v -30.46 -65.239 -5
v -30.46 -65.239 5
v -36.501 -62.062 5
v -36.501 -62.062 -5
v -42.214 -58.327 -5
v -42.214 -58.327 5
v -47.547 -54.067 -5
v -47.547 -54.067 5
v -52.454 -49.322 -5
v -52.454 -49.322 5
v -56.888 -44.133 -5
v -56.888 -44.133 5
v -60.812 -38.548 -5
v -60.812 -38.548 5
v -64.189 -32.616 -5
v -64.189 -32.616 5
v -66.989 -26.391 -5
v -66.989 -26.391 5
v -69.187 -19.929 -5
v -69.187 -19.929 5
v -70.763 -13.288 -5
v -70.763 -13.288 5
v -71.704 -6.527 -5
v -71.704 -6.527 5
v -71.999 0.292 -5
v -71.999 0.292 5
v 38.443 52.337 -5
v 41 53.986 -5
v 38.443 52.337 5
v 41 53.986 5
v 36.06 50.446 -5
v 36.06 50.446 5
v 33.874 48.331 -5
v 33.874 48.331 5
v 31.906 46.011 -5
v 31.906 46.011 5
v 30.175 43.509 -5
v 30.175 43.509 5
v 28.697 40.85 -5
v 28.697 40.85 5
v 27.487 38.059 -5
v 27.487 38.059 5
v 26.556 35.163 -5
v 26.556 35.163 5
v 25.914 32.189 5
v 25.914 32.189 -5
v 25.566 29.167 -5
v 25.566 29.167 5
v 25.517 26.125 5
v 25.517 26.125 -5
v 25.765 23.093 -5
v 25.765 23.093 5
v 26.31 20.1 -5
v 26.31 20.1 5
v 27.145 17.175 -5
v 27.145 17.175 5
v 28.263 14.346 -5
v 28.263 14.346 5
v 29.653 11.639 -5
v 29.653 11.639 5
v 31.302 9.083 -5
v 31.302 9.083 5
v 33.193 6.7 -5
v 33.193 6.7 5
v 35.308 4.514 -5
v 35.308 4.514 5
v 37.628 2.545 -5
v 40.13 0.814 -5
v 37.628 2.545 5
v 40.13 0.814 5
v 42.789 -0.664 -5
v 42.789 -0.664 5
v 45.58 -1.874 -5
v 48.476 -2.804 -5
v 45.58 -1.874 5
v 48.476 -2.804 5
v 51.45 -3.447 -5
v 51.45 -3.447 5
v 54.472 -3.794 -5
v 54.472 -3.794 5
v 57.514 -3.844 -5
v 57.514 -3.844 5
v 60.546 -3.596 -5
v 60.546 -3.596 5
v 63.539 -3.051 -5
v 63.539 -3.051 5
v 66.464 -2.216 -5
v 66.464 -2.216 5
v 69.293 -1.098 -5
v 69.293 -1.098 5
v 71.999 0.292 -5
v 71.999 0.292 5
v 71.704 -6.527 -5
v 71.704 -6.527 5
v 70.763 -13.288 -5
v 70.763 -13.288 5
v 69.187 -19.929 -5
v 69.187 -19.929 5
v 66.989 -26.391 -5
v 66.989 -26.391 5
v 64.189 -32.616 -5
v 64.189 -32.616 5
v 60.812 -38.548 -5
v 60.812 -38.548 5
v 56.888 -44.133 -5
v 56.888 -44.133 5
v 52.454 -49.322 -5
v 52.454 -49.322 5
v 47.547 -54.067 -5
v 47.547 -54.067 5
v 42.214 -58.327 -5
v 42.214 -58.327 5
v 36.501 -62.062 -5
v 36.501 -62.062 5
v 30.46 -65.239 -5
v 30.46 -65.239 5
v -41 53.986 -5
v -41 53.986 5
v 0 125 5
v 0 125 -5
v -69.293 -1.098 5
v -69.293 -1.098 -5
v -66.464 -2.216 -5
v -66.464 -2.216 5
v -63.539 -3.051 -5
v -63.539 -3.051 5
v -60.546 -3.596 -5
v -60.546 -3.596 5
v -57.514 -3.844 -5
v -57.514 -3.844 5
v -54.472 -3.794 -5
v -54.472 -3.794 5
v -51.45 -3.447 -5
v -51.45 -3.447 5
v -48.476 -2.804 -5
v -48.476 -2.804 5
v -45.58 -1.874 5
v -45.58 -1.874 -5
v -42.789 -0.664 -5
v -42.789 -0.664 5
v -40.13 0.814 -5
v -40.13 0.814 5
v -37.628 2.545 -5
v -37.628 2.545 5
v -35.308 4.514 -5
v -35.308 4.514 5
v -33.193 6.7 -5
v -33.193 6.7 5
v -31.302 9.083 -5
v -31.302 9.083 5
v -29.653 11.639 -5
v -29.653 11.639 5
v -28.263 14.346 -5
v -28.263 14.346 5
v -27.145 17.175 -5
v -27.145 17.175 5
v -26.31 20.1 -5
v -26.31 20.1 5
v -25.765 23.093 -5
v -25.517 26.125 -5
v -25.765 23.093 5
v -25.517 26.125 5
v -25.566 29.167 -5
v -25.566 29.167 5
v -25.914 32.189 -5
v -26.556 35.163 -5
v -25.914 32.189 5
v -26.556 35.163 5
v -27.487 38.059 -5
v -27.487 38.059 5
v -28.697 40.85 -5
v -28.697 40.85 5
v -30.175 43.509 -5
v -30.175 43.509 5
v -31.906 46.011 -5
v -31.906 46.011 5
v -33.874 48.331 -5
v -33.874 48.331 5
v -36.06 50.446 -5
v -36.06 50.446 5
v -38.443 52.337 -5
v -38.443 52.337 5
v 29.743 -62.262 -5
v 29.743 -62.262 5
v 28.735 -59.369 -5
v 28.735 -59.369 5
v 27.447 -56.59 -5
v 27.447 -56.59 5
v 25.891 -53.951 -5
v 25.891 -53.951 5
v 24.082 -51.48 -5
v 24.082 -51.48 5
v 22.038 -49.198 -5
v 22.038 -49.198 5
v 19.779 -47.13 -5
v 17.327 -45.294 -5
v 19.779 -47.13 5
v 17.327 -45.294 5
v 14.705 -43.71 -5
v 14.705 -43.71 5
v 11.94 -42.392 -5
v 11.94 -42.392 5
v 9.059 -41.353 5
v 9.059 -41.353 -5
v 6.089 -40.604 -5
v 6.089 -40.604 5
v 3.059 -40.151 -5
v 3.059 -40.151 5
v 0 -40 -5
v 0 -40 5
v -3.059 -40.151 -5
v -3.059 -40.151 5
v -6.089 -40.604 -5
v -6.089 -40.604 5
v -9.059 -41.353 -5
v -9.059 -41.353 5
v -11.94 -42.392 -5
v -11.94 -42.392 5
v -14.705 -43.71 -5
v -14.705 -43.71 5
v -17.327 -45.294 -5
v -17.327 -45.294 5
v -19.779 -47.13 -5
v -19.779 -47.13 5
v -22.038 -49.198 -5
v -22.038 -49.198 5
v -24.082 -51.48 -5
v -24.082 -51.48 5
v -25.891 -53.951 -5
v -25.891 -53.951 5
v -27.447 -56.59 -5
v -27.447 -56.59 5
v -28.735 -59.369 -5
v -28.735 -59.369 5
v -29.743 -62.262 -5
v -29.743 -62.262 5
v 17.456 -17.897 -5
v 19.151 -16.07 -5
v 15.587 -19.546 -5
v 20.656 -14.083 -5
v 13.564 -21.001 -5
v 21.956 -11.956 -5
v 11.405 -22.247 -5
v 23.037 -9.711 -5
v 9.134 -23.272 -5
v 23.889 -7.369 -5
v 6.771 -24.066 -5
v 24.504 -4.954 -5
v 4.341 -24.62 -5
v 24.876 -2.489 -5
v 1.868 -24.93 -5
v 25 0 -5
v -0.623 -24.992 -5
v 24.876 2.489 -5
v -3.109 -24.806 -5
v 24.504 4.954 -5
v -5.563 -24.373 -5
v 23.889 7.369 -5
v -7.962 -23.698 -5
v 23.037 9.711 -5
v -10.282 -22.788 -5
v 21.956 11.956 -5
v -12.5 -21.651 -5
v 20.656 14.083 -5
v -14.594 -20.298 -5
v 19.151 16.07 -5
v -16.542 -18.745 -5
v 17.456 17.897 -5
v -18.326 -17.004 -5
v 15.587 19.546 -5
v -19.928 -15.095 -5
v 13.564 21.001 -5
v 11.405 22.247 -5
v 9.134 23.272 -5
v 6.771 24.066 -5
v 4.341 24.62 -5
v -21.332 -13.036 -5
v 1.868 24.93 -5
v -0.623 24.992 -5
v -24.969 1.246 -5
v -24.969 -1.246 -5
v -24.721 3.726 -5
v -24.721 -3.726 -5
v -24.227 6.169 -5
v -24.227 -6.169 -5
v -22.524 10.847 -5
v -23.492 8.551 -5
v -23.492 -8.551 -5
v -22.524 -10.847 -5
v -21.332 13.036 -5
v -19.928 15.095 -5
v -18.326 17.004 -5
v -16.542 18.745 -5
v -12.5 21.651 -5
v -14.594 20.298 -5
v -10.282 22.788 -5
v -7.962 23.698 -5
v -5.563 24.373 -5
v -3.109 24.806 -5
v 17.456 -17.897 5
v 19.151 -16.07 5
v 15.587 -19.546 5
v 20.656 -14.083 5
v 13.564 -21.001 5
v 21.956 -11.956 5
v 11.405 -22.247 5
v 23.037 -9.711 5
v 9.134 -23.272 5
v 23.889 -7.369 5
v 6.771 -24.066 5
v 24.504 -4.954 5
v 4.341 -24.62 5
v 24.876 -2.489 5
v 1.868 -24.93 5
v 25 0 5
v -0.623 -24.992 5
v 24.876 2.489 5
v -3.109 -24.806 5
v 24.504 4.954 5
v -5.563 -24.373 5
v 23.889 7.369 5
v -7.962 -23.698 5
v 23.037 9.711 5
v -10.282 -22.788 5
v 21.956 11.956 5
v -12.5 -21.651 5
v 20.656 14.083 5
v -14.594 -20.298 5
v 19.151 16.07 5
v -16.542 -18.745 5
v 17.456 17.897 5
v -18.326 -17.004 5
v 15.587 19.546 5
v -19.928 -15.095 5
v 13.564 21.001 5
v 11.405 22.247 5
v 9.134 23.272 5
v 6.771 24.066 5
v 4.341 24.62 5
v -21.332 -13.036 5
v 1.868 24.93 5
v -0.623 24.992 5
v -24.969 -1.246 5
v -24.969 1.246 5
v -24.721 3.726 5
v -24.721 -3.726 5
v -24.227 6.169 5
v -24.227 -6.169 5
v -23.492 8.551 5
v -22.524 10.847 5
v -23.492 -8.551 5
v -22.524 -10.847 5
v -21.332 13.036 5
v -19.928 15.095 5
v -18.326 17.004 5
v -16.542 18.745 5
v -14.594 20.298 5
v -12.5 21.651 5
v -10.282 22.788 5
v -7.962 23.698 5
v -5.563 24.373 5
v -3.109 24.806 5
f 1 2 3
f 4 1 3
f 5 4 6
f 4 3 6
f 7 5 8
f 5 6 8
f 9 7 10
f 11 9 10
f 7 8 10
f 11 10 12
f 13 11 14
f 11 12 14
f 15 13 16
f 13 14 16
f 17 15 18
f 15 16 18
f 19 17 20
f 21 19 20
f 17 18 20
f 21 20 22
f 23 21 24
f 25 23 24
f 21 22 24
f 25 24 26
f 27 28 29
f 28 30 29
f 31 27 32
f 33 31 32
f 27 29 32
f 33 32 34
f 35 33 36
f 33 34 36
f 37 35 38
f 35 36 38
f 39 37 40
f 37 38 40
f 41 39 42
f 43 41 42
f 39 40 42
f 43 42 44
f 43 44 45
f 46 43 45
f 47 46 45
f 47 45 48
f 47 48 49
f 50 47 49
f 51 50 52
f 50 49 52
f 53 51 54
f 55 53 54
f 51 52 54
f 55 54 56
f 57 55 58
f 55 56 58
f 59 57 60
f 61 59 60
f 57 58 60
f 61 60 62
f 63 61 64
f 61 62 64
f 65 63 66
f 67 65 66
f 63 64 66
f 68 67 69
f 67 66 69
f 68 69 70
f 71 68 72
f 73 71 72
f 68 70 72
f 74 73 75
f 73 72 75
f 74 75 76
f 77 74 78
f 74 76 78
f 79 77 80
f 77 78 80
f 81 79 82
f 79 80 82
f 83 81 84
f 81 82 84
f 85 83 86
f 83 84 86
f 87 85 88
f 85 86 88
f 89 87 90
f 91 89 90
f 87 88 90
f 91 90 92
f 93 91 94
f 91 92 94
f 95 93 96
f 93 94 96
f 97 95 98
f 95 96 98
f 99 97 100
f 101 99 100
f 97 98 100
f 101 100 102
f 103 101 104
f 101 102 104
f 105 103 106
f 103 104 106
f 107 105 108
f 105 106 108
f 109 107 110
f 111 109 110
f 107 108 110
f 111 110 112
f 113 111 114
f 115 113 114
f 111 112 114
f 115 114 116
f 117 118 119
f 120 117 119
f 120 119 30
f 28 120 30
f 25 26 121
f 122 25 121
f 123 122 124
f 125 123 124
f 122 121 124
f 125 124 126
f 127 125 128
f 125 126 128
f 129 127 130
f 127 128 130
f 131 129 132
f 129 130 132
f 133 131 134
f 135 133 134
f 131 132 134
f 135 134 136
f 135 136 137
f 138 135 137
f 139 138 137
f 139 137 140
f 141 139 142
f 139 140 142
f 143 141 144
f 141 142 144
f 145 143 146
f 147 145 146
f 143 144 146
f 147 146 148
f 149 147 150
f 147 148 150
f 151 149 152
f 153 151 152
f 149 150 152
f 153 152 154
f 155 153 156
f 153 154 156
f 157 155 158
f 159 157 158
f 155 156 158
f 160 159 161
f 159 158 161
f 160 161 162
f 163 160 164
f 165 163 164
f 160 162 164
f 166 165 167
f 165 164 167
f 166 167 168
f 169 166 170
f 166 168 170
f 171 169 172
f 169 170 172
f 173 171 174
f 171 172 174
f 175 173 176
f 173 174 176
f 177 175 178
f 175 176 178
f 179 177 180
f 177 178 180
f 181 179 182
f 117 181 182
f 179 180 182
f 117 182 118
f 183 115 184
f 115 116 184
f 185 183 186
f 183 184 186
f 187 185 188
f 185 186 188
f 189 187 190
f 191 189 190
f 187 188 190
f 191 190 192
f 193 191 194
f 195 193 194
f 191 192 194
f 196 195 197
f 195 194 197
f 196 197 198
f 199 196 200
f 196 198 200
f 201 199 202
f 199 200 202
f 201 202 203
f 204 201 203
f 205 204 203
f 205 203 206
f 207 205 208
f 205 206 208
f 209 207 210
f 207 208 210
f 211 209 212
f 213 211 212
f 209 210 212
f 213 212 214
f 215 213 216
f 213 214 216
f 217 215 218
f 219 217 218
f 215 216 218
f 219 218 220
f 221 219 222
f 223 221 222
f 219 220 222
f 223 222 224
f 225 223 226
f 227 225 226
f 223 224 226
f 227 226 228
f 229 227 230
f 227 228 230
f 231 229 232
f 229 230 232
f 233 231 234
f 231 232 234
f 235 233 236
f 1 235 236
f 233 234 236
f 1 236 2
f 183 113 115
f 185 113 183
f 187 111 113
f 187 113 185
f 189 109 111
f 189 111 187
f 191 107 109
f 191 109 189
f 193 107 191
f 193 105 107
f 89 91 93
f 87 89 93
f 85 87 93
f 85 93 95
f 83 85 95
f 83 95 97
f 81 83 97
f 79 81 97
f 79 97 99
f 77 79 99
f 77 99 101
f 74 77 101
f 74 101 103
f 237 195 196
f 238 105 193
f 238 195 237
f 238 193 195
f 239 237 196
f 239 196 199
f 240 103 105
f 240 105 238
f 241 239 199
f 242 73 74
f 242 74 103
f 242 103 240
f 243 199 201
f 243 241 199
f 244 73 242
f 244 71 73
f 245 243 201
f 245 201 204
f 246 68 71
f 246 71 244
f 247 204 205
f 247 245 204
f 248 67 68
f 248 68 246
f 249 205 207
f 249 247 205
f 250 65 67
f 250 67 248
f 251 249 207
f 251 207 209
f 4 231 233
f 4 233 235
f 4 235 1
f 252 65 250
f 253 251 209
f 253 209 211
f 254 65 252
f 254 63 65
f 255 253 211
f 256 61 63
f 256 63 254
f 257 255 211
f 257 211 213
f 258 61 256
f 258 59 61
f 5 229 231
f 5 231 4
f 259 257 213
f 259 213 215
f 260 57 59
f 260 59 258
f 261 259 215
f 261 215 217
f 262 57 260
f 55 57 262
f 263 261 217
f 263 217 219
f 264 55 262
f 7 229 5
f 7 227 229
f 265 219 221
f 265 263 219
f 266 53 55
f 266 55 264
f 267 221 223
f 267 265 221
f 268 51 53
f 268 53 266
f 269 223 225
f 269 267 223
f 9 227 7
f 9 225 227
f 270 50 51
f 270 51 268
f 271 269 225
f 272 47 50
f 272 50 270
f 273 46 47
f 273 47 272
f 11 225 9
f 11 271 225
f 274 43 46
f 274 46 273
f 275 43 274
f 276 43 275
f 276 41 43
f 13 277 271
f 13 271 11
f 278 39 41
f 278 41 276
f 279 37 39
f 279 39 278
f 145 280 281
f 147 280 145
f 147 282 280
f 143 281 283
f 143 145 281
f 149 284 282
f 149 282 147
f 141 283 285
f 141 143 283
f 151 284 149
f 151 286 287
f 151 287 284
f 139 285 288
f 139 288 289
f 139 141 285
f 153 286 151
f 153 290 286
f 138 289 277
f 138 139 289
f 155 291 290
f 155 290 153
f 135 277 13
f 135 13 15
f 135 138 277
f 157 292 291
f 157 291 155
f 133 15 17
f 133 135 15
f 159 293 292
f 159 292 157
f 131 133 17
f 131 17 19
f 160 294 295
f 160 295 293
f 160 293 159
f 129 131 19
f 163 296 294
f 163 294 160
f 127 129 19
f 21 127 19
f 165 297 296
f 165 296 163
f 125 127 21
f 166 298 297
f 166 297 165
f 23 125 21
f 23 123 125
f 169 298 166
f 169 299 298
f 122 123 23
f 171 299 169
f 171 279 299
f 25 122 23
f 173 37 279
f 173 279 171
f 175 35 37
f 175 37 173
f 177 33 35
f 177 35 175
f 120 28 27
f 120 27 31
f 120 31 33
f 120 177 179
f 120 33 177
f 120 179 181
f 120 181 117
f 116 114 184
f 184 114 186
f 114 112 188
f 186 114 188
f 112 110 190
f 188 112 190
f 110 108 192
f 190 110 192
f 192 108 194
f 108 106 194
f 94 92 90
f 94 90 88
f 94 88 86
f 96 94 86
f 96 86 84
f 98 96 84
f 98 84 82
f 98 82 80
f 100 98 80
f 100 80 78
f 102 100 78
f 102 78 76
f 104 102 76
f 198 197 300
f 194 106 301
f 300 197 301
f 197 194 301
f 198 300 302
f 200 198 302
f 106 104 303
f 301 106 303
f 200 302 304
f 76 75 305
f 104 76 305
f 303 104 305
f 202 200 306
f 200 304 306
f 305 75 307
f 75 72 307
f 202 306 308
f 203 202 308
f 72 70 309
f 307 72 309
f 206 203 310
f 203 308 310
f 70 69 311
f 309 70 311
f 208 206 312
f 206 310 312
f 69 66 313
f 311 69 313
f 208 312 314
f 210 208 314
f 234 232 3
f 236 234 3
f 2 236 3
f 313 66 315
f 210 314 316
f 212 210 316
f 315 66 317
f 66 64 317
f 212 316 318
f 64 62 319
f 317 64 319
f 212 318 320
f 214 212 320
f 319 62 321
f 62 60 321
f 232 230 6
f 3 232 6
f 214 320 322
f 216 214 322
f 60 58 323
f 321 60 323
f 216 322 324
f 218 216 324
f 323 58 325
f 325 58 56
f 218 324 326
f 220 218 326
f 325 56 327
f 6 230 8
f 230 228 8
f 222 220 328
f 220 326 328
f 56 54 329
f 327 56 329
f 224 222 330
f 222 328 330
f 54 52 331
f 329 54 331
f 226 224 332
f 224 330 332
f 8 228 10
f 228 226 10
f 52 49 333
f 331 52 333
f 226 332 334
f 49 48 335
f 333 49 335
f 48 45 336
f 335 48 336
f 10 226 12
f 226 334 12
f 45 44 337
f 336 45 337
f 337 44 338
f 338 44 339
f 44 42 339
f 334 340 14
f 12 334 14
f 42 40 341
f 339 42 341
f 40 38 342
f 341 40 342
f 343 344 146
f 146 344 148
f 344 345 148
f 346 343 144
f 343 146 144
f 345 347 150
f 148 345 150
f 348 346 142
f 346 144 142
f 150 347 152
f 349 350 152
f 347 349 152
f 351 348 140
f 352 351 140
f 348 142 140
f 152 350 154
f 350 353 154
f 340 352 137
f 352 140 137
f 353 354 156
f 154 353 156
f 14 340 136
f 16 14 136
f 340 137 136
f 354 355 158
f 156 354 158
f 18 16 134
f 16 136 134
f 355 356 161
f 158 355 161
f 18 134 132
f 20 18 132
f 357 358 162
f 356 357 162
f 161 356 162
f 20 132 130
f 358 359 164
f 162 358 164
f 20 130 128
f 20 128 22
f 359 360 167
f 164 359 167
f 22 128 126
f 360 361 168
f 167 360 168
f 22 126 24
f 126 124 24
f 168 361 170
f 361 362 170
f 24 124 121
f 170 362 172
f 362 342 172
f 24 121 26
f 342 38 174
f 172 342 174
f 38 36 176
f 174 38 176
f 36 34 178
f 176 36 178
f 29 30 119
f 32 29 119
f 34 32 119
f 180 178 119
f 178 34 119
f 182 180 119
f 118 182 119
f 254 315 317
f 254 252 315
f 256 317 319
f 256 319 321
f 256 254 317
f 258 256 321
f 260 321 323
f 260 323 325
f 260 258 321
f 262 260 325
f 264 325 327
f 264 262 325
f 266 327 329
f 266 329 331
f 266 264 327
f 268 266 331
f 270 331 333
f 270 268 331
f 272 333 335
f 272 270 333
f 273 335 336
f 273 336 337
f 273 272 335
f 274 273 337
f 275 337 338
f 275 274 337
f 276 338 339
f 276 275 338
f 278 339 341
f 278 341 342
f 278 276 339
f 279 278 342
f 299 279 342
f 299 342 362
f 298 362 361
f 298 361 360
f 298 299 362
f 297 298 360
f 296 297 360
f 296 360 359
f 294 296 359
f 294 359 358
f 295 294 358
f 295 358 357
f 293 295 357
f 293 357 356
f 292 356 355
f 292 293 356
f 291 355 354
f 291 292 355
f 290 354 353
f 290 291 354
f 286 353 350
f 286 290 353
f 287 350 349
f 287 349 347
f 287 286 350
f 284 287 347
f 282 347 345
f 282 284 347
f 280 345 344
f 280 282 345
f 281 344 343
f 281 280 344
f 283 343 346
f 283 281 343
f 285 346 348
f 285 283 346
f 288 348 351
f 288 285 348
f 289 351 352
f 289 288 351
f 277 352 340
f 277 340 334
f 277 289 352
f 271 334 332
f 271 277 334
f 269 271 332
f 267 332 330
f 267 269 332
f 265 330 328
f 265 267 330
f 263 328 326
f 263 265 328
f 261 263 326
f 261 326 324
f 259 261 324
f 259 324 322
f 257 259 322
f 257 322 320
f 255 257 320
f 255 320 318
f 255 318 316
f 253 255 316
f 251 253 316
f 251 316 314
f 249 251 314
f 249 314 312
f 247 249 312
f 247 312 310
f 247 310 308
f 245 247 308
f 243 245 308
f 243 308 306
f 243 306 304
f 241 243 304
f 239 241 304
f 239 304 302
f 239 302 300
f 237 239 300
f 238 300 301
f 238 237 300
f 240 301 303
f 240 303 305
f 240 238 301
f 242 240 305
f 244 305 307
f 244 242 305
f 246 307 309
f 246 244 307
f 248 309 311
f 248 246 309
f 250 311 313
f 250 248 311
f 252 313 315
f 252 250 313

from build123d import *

# Parameters (mm, degrees)
SKETCH1_6_R         = 25
BOSS_EXTRUDE3_DEPTH = 5


with BuildPart() as part:
    # Sketch1<6> → Boss-Extrude3 (new, symmetric)
    with BuildSketch(Plane.XY):
        with BuildLine():
            Line((0, 125), (41, 53.98591689))
            ThreePointArc((41, 53.98591689), (29.653041557, 11.639425428), (71.999407886, 0.292000007))
            ThreePointArc((71.999407886, 0.292000007), (60.81182851, -38.5476525), (30.460070741, -65.23943662))
            ThreePointArc((30.460070741, -65.23943662), (0, -40), (-30.460070741, -65.23943662))
            ThreePointArc((-30.460070741, -65.23943662), (-60.81182851, -38.5476525), (-71.999407886, 0.292000007))
            ThreePointArc((-71.999407886, 0.292000007), (-29.653041557, 11.639425428), (-41, 53.98591689))
            Line((-41, 53.98591689), (0, 125))
        make_face()
        Circle(SKETCH1_6_R, mode=Mode.SUBTRACT)
    extrude(amount=BOSS_EXTRUDE3_DEPTH, both=True)


solid = part.part
